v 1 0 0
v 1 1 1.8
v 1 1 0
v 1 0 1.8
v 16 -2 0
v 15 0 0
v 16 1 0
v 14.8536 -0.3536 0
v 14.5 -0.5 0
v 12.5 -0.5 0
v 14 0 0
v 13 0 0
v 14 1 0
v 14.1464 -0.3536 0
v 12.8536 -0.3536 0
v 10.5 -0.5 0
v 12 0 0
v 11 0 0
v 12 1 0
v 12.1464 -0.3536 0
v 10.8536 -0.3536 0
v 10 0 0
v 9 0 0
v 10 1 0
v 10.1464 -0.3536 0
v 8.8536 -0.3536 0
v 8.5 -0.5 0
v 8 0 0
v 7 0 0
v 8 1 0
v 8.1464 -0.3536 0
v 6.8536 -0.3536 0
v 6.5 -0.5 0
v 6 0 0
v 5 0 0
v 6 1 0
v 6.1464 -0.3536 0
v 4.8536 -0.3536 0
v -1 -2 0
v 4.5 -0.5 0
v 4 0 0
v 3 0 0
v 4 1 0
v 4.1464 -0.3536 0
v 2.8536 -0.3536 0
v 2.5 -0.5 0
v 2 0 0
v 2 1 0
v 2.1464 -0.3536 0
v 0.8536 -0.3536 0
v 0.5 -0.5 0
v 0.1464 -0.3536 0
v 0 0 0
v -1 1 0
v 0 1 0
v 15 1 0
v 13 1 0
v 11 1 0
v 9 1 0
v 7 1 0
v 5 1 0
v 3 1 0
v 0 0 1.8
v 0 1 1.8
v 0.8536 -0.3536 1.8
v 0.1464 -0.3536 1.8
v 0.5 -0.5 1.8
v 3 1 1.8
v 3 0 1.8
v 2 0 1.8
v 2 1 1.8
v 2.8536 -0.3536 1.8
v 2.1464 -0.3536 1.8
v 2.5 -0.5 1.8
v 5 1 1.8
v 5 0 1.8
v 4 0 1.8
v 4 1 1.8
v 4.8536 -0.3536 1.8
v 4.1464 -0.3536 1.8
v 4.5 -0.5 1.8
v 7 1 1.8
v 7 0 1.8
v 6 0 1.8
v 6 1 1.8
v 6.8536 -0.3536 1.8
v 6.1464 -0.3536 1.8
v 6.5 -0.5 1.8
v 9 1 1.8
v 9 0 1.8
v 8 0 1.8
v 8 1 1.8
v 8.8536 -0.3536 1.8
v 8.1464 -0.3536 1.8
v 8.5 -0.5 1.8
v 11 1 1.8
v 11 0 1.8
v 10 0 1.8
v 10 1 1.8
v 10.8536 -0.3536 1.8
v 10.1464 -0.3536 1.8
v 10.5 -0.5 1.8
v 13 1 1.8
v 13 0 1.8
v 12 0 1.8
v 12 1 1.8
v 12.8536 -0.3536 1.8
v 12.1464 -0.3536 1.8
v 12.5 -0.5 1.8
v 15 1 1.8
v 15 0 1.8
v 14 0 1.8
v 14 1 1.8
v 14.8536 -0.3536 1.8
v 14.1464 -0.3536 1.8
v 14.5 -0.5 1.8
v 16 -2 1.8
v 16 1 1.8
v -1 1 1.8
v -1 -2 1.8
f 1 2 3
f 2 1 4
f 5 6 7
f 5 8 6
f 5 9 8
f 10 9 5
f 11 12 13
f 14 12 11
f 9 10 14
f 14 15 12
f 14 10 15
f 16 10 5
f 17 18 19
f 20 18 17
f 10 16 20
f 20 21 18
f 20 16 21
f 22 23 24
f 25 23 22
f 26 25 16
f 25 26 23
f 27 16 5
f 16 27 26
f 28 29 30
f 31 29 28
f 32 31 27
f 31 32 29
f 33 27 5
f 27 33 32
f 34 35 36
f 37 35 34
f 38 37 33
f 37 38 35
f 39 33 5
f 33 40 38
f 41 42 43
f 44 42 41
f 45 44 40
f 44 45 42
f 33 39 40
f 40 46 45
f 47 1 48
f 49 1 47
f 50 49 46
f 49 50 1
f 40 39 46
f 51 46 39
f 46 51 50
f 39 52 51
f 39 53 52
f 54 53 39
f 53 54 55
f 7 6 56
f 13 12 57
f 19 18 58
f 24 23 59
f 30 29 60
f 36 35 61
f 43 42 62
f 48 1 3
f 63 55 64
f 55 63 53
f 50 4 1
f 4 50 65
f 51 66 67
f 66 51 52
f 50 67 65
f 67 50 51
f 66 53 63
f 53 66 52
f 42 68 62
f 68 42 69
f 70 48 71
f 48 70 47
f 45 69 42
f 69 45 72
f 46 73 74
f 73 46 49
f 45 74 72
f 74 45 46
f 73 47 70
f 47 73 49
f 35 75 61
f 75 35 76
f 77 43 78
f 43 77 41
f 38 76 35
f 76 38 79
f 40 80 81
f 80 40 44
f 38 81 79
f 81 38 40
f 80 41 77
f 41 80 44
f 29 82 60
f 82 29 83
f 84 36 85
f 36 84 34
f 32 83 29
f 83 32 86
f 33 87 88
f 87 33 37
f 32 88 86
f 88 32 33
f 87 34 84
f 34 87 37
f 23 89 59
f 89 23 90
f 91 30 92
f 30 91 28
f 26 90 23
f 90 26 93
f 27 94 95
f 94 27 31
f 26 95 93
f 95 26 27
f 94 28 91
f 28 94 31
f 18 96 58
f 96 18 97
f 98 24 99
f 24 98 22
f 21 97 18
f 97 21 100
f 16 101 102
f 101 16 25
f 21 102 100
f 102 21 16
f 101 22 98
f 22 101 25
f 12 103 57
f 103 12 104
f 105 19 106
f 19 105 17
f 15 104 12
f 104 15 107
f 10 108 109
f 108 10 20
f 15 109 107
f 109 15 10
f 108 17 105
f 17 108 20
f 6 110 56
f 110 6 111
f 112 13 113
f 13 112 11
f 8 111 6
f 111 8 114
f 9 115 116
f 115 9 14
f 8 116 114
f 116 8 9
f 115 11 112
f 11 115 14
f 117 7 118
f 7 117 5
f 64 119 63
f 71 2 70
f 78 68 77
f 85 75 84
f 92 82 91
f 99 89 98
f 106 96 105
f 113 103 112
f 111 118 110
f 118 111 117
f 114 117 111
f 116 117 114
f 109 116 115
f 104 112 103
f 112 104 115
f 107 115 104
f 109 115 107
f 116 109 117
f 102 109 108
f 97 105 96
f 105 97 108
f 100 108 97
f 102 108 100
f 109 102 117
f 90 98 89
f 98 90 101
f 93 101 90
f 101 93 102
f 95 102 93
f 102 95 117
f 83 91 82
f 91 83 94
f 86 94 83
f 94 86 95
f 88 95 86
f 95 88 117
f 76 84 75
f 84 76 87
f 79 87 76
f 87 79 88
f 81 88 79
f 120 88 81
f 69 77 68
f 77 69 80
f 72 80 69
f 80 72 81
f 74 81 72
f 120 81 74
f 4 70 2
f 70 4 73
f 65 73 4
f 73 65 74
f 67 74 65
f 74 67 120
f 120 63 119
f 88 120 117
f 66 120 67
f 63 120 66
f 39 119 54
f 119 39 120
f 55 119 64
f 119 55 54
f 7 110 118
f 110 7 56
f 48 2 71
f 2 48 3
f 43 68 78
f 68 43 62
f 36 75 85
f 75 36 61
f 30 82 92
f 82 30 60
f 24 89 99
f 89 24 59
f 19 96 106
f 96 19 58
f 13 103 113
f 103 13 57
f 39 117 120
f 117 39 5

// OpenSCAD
difference(){

translate([-1,-2,0]) cube([17,3,1.8]);

for(i=[0:1:7])
translate([2*i,0,0])  
union(){
      cube([1,2.5,2]);
      translate([0.5,0,0])cylinder(d=1,h=2,$fn=8);
 }
 }
